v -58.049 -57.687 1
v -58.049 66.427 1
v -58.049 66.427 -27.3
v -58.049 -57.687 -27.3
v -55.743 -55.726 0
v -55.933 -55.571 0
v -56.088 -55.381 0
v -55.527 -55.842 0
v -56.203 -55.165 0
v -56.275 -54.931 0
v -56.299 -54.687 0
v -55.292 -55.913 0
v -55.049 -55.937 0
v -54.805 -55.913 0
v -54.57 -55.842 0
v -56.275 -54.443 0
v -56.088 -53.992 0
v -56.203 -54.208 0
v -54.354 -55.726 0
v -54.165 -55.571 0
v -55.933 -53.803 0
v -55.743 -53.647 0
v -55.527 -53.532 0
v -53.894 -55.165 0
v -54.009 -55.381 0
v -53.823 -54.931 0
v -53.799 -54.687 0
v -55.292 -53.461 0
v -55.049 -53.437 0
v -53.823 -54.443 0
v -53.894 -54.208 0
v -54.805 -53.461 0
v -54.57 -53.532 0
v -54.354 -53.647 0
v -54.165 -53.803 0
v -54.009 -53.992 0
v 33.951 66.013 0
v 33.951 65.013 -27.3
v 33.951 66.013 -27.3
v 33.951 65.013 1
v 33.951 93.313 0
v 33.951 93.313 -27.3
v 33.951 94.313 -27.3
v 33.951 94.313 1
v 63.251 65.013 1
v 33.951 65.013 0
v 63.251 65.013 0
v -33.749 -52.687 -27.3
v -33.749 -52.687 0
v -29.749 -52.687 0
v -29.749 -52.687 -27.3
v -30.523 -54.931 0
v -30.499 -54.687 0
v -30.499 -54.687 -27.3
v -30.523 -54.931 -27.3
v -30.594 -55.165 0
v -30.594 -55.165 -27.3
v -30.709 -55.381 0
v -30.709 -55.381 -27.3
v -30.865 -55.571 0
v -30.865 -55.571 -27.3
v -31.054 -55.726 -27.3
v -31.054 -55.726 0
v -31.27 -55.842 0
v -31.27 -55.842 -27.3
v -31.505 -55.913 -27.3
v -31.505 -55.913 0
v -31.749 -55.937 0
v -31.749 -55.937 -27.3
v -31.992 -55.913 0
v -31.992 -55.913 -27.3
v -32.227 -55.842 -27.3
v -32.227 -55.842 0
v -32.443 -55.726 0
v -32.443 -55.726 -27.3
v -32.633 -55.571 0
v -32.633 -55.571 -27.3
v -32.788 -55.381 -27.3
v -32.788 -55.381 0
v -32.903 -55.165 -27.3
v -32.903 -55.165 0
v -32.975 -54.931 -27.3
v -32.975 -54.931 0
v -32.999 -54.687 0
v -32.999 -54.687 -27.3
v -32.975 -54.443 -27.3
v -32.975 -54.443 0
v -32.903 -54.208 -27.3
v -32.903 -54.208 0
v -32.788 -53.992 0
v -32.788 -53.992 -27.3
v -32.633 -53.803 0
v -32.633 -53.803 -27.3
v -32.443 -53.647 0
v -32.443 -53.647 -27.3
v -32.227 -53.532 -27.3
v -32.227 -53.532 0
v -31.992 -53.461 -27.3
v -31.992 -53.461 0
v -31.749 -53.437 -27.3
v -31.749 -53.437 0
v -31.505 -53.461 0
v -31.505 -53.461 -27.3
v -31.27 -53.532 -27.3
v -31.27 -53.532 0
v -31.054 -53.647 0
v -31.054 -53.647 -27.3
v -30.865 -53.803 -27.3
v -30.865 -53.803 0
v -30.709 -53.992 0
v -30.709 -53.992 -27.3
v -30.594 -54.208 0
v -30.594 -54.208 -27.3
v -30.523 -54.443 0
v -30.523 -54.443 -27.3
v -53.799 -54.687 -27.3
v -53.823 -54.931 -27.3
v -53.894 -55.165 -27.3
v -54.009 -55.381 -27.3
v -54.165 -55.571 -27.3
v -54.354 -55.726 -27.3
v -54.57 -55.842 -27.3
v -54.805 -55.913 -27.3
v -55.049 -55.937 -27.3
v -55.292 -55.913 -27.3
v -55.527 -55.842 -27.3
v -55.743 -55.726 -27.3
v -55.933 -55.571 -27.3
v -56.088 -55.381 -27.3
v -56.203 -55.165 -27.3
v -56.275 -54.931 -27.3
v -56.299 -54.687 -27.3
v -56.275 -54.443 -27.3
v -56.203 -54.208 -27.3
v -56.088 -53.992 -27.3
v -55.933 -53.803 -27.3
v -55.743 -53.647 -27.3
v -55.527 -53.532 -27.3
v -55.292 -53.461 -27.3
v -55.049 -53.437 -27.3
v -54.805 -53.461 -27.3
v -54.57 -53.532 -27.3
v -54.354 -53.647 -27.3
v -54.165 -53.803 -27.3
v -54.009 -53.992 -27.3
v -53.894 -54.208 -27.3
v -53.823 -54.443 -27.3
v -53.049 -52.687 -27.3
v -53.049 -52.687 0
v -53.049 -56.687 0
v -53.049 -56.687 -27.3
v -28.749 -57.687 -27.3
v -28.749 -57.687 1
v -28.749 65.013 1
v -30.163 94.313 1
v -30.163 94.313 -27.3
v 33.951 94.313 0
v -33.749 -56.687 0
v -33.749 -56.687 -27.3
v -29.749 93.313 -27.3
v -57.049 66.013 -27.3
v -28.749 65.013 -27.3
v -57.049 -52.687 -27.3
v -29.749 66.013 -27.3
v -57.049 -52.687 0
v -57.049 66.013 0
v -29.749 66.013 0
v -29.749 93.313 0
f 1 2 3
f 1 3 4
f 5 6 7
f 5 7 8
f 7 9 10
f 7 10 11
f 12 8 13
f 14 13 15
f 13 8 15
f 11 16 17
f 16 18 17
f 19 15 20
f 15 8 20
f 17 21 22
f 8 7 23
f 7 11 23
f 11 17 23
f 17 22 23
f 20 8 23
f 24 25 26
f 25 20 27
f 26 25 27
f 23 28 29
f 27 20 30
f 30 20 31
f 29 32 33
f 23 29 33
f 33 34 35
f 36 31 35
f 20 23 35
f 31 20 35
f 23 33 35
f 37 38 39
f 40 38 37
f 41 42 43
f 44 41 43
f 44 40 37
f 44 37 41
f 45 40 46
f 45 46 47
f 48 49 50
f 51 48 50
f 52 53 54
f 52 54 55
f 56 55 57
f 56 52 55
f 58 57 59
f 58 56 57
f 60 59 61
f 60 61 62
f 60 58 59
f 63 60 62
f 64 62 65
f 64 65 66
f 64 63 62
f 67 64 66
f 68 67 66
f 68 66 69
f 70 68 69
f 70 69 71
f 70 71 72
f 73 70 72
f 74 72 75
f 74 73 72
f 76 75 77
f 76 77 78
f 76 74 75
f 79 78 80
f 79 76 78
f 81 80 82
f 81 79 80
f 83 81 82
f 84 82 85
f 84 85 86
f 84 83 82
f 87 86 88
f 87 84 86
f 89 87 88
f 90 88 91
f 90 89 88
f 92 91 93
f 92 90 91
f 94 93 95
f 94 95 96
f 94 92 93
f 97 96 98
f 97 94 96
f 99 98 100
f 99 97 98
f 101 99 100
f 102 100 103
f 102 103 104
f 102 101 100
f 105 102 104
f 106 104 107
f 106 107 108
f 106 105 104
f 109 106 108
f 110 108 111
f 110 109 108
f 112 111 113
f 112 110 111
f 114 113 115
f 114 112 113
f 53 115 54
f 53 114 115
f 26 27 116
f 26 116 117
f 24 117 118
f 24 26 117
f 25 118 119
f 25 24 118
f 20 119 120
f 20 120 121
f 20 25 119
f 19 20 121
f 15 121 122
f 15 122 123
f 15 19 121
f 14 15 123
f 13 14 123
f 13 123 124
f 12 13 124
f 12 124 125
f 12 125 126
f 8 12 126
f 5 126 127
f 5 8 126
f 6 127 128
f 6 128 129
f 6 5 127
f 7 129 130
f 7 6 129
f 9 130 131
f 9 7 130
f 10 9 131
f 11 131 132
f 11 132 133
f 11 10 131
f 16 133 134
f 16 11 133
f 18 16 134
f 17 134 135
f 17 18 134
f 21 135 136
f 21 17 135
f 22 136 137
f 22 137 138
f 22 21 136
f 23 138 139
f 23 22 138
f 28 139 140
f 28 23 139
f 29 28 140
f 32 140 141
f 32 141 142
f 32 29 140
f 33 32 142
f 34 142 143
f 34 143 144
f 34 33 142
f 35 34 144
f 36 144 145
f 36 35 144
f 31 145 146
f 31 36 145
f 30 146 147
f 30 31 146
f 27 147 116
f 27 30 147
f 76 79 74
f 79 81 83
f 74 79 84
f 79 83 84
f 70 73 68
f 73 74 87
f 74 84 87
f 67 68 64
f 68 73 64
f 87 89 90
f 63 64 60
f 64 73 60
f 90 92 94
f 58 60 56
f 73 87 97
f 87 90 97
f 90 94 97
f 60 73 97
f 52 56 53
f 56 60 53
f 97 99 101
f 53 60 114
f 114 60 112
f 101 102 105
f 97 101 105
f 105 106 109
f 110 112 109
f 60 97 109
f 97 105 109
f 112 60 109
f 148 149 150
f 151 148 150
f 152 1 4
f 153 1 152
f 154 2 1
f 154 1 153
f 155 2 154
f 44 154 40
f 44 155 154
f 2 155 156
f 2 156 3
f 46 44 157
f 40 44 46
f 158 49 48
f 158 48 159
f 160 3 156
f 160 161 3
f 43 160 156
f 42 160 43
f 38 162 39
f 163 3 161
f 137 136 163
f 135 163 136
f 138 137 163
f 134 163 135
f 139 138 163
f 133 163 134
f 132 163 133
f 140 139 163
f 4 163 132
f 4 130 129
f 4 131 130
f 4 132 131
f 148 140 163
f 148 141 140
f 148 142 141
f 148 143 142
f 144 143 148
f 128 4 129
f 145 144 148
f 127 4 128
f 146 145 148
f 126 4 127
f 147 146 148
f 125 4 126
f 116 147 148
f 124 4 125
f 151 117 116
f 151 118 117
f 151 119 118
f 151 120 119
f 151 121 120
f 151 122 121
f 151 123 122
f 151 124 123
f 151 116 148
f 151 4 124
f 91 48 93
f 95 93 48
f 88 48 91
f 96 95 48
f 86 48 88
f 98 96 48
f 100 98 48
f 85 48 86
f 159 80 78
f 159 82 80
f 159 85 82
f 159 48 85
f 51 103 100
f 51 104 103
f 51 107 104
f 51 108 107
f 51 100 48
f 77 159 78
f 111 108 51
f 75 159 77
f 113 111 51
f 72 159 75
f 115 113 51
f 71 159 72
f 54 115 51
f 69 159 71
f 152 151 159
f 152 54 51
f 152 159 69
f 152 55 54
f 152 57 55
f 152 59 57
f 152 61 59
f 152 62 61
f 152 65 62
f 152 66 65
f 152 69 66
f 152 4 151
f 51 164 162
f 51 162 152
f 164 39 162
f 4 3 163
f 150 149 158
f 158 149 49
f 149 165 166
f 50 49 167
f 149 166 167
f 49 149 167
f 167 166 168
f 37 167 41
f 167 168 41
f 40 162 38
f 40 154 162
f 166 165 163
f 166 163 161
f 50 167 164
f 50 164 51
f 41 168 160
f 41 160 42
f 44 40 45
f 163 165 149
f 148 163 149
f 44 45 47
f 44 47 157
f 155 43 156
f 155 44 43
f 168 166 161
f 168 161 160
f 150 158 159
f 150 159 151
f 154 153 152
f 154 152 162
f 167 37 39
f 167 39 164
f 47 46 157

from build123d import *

# Parameters (mm, degrees)
F2_W      = 4
F2_H      = 4
F2_R      = 1
F3_DEPTH  = 1
F4_DEPTH  = 27.3
F5_W      = 4
F5_H      = 4
F5_R      = 1.25
F6_DEPTH  = 27.3
F7_W      = 1
F7_H      = 27.3
F8_DEPTH  = 27.3
F10_DEPTH = 1


with BuildPart() as f3:
    # F2 (on Top) → F3 (new body)
    with BuildSketch(Plane.XY):
        Polygon((33.9513780442, 94.3132289106), (-30.1628355182, 94.3132289106), (-58.0486219558, 66.427442473), (-58.0486219558, -57.6867710894), (-28.7486219558, -57.6867710894), (-28.7486219558, 65.0132289106), (33.9513780442, 65.0132289106), align=None)
        Polygon((-53.0486219558, -56.6867710894), (-57.0486219558, -56.6867710894), (-57.0486219558, -52.6867710894), (-57.0486219558, 66.0132289106), (-29.7486219558, 93.3132289106), (32.9513780442, 93.3132289106), (32.9513780442, 66.0132289106), (-29.7486219558, 66.0132289106), (-29.7486219558, -52.6867710894), (-29.7486219558, -56.6867710894), (-33.7486219558, -56.6867710894), align=None, mode=Mode.SUBTRACT)
        Polygon((-53.0486219558, -52.6867710894), (-53.0486219558, -56.6867710894), (-33.7486219558, -56.6867710894), (-33.7486219558, -52.6867710894), (-29.7486219558, -52.6867710894), (-29.7486219558, 66.0132289106), (32.9513780442, 66.0132289106), (32.9513780442, 93.3132289106), (-29.7486219558, 93.3132289106), (-57.0486219558, 66.0132289106), (-57.0486219558, -52.6867710894), align=None)
        with Locations((-31.7486219558, -54.6867710894)):
            Rectangle(F2_W, F2_H)
        with Locations((-31.7486219558, -54.6867710894)):
            Circle(F2_R, mode=Mode.SUBTRACT)
        with Locations((-55.0486219558, -54.6867710894)):
            Rectangle(F2_W, F2_H)
        with Locations((-55.0486219558, -54.6867710894)):
            Circle(F2_R, mode=Mode.SUBTRACT)
        with Locations((-31.7486219558, -54.6867710894)):
            Circle(F2_R)
        with Locations((-55.0486219558, -54.6867710894)):
            Circle(F2_R)
    extrude(amount=F3_DEPTH)

    # F2 (on Top) → F4 (join)
    with BuildSketch(Plane.XY):
        Polygon((33.9513780442, 94.3132289106), (-30.1628355182, 94.3132289106), (-58.0486219558, 66.427442473), (-58.0486219558, -57.6867710894), (-28.7486219558, -57.6867710894), (-28.7486219558, 65.0132289106), (33.9513780442, 65.0132289106), align=None)
        Polygon((-53.0486219558, -56.6867710894), (-57.0486219558, -56.6867710894), (-57.0486219558, -52.6867710894), (-57.0486219558, 66.0132289106), (-29.7486219558, 93.3132289106), (32.9513780442, 93.3132289106), (32.9513780442, 66.0132289106), (-29.7486219558, 66.0132289106), (-29.7486219558, -52.6867710894), (-29.7486219558, -56.6867710894), (-33.7486219558, -56.6867710894), align=None, mode=Mode.SUBTRACT)
    extrude(amount=-F4_DEPTH)

    # F5 (on face) → F6 (join)
    with BuildSketch(Plane(origin=(0, 0, 0), x_dir=(1, 0, 0), z_dir=(0, 0, -1))):
        with Locations((-55.0486219558, 54.6867710894)):
            Rectangle(F5_W, F5_H)
        with Locations((-55.0486219558, 54.6867710894)):
            Circle(F5_R, mode=Mode.SUBTRACT)
        with Locations((-31.7486219558, 54.6867710894)):
            Rectangle(F5_W, F5_H)
        with Locations((-31.7486219558, 54.6867710894)):
            Circle(F5_R, mode=Mode.SUBTRACT)
    extrude(amount=F6_DEPTH)

    # F7 (on face) → F8 (cut, through all)
    with BuildSketch(Plane(origin=(0, 0, -27.3), x_dir=(1, 0, 0), z_dir=(0, 0, -1))):
        with Locations((33.4513780442, -79.6632289106)):
            Rectangle(F7_W, F7_H)
    extrude(amount=-F8_DEPTH, mode=Mode.SUBTRACT)


with BuildPart() as f10:
    # F9 (on face) → F10 (new body)
    with BuildSketch(Plane.XY.offset(1)):
        Polygon((63.2513780442, 65.0132289106), (33.9513780442, 94.3132289106), (33.9513780442, 65.0132289106), align=None)
    extrude(amount=-F10_DEPTH)


solid = Compound([f3.part, f10.part])
